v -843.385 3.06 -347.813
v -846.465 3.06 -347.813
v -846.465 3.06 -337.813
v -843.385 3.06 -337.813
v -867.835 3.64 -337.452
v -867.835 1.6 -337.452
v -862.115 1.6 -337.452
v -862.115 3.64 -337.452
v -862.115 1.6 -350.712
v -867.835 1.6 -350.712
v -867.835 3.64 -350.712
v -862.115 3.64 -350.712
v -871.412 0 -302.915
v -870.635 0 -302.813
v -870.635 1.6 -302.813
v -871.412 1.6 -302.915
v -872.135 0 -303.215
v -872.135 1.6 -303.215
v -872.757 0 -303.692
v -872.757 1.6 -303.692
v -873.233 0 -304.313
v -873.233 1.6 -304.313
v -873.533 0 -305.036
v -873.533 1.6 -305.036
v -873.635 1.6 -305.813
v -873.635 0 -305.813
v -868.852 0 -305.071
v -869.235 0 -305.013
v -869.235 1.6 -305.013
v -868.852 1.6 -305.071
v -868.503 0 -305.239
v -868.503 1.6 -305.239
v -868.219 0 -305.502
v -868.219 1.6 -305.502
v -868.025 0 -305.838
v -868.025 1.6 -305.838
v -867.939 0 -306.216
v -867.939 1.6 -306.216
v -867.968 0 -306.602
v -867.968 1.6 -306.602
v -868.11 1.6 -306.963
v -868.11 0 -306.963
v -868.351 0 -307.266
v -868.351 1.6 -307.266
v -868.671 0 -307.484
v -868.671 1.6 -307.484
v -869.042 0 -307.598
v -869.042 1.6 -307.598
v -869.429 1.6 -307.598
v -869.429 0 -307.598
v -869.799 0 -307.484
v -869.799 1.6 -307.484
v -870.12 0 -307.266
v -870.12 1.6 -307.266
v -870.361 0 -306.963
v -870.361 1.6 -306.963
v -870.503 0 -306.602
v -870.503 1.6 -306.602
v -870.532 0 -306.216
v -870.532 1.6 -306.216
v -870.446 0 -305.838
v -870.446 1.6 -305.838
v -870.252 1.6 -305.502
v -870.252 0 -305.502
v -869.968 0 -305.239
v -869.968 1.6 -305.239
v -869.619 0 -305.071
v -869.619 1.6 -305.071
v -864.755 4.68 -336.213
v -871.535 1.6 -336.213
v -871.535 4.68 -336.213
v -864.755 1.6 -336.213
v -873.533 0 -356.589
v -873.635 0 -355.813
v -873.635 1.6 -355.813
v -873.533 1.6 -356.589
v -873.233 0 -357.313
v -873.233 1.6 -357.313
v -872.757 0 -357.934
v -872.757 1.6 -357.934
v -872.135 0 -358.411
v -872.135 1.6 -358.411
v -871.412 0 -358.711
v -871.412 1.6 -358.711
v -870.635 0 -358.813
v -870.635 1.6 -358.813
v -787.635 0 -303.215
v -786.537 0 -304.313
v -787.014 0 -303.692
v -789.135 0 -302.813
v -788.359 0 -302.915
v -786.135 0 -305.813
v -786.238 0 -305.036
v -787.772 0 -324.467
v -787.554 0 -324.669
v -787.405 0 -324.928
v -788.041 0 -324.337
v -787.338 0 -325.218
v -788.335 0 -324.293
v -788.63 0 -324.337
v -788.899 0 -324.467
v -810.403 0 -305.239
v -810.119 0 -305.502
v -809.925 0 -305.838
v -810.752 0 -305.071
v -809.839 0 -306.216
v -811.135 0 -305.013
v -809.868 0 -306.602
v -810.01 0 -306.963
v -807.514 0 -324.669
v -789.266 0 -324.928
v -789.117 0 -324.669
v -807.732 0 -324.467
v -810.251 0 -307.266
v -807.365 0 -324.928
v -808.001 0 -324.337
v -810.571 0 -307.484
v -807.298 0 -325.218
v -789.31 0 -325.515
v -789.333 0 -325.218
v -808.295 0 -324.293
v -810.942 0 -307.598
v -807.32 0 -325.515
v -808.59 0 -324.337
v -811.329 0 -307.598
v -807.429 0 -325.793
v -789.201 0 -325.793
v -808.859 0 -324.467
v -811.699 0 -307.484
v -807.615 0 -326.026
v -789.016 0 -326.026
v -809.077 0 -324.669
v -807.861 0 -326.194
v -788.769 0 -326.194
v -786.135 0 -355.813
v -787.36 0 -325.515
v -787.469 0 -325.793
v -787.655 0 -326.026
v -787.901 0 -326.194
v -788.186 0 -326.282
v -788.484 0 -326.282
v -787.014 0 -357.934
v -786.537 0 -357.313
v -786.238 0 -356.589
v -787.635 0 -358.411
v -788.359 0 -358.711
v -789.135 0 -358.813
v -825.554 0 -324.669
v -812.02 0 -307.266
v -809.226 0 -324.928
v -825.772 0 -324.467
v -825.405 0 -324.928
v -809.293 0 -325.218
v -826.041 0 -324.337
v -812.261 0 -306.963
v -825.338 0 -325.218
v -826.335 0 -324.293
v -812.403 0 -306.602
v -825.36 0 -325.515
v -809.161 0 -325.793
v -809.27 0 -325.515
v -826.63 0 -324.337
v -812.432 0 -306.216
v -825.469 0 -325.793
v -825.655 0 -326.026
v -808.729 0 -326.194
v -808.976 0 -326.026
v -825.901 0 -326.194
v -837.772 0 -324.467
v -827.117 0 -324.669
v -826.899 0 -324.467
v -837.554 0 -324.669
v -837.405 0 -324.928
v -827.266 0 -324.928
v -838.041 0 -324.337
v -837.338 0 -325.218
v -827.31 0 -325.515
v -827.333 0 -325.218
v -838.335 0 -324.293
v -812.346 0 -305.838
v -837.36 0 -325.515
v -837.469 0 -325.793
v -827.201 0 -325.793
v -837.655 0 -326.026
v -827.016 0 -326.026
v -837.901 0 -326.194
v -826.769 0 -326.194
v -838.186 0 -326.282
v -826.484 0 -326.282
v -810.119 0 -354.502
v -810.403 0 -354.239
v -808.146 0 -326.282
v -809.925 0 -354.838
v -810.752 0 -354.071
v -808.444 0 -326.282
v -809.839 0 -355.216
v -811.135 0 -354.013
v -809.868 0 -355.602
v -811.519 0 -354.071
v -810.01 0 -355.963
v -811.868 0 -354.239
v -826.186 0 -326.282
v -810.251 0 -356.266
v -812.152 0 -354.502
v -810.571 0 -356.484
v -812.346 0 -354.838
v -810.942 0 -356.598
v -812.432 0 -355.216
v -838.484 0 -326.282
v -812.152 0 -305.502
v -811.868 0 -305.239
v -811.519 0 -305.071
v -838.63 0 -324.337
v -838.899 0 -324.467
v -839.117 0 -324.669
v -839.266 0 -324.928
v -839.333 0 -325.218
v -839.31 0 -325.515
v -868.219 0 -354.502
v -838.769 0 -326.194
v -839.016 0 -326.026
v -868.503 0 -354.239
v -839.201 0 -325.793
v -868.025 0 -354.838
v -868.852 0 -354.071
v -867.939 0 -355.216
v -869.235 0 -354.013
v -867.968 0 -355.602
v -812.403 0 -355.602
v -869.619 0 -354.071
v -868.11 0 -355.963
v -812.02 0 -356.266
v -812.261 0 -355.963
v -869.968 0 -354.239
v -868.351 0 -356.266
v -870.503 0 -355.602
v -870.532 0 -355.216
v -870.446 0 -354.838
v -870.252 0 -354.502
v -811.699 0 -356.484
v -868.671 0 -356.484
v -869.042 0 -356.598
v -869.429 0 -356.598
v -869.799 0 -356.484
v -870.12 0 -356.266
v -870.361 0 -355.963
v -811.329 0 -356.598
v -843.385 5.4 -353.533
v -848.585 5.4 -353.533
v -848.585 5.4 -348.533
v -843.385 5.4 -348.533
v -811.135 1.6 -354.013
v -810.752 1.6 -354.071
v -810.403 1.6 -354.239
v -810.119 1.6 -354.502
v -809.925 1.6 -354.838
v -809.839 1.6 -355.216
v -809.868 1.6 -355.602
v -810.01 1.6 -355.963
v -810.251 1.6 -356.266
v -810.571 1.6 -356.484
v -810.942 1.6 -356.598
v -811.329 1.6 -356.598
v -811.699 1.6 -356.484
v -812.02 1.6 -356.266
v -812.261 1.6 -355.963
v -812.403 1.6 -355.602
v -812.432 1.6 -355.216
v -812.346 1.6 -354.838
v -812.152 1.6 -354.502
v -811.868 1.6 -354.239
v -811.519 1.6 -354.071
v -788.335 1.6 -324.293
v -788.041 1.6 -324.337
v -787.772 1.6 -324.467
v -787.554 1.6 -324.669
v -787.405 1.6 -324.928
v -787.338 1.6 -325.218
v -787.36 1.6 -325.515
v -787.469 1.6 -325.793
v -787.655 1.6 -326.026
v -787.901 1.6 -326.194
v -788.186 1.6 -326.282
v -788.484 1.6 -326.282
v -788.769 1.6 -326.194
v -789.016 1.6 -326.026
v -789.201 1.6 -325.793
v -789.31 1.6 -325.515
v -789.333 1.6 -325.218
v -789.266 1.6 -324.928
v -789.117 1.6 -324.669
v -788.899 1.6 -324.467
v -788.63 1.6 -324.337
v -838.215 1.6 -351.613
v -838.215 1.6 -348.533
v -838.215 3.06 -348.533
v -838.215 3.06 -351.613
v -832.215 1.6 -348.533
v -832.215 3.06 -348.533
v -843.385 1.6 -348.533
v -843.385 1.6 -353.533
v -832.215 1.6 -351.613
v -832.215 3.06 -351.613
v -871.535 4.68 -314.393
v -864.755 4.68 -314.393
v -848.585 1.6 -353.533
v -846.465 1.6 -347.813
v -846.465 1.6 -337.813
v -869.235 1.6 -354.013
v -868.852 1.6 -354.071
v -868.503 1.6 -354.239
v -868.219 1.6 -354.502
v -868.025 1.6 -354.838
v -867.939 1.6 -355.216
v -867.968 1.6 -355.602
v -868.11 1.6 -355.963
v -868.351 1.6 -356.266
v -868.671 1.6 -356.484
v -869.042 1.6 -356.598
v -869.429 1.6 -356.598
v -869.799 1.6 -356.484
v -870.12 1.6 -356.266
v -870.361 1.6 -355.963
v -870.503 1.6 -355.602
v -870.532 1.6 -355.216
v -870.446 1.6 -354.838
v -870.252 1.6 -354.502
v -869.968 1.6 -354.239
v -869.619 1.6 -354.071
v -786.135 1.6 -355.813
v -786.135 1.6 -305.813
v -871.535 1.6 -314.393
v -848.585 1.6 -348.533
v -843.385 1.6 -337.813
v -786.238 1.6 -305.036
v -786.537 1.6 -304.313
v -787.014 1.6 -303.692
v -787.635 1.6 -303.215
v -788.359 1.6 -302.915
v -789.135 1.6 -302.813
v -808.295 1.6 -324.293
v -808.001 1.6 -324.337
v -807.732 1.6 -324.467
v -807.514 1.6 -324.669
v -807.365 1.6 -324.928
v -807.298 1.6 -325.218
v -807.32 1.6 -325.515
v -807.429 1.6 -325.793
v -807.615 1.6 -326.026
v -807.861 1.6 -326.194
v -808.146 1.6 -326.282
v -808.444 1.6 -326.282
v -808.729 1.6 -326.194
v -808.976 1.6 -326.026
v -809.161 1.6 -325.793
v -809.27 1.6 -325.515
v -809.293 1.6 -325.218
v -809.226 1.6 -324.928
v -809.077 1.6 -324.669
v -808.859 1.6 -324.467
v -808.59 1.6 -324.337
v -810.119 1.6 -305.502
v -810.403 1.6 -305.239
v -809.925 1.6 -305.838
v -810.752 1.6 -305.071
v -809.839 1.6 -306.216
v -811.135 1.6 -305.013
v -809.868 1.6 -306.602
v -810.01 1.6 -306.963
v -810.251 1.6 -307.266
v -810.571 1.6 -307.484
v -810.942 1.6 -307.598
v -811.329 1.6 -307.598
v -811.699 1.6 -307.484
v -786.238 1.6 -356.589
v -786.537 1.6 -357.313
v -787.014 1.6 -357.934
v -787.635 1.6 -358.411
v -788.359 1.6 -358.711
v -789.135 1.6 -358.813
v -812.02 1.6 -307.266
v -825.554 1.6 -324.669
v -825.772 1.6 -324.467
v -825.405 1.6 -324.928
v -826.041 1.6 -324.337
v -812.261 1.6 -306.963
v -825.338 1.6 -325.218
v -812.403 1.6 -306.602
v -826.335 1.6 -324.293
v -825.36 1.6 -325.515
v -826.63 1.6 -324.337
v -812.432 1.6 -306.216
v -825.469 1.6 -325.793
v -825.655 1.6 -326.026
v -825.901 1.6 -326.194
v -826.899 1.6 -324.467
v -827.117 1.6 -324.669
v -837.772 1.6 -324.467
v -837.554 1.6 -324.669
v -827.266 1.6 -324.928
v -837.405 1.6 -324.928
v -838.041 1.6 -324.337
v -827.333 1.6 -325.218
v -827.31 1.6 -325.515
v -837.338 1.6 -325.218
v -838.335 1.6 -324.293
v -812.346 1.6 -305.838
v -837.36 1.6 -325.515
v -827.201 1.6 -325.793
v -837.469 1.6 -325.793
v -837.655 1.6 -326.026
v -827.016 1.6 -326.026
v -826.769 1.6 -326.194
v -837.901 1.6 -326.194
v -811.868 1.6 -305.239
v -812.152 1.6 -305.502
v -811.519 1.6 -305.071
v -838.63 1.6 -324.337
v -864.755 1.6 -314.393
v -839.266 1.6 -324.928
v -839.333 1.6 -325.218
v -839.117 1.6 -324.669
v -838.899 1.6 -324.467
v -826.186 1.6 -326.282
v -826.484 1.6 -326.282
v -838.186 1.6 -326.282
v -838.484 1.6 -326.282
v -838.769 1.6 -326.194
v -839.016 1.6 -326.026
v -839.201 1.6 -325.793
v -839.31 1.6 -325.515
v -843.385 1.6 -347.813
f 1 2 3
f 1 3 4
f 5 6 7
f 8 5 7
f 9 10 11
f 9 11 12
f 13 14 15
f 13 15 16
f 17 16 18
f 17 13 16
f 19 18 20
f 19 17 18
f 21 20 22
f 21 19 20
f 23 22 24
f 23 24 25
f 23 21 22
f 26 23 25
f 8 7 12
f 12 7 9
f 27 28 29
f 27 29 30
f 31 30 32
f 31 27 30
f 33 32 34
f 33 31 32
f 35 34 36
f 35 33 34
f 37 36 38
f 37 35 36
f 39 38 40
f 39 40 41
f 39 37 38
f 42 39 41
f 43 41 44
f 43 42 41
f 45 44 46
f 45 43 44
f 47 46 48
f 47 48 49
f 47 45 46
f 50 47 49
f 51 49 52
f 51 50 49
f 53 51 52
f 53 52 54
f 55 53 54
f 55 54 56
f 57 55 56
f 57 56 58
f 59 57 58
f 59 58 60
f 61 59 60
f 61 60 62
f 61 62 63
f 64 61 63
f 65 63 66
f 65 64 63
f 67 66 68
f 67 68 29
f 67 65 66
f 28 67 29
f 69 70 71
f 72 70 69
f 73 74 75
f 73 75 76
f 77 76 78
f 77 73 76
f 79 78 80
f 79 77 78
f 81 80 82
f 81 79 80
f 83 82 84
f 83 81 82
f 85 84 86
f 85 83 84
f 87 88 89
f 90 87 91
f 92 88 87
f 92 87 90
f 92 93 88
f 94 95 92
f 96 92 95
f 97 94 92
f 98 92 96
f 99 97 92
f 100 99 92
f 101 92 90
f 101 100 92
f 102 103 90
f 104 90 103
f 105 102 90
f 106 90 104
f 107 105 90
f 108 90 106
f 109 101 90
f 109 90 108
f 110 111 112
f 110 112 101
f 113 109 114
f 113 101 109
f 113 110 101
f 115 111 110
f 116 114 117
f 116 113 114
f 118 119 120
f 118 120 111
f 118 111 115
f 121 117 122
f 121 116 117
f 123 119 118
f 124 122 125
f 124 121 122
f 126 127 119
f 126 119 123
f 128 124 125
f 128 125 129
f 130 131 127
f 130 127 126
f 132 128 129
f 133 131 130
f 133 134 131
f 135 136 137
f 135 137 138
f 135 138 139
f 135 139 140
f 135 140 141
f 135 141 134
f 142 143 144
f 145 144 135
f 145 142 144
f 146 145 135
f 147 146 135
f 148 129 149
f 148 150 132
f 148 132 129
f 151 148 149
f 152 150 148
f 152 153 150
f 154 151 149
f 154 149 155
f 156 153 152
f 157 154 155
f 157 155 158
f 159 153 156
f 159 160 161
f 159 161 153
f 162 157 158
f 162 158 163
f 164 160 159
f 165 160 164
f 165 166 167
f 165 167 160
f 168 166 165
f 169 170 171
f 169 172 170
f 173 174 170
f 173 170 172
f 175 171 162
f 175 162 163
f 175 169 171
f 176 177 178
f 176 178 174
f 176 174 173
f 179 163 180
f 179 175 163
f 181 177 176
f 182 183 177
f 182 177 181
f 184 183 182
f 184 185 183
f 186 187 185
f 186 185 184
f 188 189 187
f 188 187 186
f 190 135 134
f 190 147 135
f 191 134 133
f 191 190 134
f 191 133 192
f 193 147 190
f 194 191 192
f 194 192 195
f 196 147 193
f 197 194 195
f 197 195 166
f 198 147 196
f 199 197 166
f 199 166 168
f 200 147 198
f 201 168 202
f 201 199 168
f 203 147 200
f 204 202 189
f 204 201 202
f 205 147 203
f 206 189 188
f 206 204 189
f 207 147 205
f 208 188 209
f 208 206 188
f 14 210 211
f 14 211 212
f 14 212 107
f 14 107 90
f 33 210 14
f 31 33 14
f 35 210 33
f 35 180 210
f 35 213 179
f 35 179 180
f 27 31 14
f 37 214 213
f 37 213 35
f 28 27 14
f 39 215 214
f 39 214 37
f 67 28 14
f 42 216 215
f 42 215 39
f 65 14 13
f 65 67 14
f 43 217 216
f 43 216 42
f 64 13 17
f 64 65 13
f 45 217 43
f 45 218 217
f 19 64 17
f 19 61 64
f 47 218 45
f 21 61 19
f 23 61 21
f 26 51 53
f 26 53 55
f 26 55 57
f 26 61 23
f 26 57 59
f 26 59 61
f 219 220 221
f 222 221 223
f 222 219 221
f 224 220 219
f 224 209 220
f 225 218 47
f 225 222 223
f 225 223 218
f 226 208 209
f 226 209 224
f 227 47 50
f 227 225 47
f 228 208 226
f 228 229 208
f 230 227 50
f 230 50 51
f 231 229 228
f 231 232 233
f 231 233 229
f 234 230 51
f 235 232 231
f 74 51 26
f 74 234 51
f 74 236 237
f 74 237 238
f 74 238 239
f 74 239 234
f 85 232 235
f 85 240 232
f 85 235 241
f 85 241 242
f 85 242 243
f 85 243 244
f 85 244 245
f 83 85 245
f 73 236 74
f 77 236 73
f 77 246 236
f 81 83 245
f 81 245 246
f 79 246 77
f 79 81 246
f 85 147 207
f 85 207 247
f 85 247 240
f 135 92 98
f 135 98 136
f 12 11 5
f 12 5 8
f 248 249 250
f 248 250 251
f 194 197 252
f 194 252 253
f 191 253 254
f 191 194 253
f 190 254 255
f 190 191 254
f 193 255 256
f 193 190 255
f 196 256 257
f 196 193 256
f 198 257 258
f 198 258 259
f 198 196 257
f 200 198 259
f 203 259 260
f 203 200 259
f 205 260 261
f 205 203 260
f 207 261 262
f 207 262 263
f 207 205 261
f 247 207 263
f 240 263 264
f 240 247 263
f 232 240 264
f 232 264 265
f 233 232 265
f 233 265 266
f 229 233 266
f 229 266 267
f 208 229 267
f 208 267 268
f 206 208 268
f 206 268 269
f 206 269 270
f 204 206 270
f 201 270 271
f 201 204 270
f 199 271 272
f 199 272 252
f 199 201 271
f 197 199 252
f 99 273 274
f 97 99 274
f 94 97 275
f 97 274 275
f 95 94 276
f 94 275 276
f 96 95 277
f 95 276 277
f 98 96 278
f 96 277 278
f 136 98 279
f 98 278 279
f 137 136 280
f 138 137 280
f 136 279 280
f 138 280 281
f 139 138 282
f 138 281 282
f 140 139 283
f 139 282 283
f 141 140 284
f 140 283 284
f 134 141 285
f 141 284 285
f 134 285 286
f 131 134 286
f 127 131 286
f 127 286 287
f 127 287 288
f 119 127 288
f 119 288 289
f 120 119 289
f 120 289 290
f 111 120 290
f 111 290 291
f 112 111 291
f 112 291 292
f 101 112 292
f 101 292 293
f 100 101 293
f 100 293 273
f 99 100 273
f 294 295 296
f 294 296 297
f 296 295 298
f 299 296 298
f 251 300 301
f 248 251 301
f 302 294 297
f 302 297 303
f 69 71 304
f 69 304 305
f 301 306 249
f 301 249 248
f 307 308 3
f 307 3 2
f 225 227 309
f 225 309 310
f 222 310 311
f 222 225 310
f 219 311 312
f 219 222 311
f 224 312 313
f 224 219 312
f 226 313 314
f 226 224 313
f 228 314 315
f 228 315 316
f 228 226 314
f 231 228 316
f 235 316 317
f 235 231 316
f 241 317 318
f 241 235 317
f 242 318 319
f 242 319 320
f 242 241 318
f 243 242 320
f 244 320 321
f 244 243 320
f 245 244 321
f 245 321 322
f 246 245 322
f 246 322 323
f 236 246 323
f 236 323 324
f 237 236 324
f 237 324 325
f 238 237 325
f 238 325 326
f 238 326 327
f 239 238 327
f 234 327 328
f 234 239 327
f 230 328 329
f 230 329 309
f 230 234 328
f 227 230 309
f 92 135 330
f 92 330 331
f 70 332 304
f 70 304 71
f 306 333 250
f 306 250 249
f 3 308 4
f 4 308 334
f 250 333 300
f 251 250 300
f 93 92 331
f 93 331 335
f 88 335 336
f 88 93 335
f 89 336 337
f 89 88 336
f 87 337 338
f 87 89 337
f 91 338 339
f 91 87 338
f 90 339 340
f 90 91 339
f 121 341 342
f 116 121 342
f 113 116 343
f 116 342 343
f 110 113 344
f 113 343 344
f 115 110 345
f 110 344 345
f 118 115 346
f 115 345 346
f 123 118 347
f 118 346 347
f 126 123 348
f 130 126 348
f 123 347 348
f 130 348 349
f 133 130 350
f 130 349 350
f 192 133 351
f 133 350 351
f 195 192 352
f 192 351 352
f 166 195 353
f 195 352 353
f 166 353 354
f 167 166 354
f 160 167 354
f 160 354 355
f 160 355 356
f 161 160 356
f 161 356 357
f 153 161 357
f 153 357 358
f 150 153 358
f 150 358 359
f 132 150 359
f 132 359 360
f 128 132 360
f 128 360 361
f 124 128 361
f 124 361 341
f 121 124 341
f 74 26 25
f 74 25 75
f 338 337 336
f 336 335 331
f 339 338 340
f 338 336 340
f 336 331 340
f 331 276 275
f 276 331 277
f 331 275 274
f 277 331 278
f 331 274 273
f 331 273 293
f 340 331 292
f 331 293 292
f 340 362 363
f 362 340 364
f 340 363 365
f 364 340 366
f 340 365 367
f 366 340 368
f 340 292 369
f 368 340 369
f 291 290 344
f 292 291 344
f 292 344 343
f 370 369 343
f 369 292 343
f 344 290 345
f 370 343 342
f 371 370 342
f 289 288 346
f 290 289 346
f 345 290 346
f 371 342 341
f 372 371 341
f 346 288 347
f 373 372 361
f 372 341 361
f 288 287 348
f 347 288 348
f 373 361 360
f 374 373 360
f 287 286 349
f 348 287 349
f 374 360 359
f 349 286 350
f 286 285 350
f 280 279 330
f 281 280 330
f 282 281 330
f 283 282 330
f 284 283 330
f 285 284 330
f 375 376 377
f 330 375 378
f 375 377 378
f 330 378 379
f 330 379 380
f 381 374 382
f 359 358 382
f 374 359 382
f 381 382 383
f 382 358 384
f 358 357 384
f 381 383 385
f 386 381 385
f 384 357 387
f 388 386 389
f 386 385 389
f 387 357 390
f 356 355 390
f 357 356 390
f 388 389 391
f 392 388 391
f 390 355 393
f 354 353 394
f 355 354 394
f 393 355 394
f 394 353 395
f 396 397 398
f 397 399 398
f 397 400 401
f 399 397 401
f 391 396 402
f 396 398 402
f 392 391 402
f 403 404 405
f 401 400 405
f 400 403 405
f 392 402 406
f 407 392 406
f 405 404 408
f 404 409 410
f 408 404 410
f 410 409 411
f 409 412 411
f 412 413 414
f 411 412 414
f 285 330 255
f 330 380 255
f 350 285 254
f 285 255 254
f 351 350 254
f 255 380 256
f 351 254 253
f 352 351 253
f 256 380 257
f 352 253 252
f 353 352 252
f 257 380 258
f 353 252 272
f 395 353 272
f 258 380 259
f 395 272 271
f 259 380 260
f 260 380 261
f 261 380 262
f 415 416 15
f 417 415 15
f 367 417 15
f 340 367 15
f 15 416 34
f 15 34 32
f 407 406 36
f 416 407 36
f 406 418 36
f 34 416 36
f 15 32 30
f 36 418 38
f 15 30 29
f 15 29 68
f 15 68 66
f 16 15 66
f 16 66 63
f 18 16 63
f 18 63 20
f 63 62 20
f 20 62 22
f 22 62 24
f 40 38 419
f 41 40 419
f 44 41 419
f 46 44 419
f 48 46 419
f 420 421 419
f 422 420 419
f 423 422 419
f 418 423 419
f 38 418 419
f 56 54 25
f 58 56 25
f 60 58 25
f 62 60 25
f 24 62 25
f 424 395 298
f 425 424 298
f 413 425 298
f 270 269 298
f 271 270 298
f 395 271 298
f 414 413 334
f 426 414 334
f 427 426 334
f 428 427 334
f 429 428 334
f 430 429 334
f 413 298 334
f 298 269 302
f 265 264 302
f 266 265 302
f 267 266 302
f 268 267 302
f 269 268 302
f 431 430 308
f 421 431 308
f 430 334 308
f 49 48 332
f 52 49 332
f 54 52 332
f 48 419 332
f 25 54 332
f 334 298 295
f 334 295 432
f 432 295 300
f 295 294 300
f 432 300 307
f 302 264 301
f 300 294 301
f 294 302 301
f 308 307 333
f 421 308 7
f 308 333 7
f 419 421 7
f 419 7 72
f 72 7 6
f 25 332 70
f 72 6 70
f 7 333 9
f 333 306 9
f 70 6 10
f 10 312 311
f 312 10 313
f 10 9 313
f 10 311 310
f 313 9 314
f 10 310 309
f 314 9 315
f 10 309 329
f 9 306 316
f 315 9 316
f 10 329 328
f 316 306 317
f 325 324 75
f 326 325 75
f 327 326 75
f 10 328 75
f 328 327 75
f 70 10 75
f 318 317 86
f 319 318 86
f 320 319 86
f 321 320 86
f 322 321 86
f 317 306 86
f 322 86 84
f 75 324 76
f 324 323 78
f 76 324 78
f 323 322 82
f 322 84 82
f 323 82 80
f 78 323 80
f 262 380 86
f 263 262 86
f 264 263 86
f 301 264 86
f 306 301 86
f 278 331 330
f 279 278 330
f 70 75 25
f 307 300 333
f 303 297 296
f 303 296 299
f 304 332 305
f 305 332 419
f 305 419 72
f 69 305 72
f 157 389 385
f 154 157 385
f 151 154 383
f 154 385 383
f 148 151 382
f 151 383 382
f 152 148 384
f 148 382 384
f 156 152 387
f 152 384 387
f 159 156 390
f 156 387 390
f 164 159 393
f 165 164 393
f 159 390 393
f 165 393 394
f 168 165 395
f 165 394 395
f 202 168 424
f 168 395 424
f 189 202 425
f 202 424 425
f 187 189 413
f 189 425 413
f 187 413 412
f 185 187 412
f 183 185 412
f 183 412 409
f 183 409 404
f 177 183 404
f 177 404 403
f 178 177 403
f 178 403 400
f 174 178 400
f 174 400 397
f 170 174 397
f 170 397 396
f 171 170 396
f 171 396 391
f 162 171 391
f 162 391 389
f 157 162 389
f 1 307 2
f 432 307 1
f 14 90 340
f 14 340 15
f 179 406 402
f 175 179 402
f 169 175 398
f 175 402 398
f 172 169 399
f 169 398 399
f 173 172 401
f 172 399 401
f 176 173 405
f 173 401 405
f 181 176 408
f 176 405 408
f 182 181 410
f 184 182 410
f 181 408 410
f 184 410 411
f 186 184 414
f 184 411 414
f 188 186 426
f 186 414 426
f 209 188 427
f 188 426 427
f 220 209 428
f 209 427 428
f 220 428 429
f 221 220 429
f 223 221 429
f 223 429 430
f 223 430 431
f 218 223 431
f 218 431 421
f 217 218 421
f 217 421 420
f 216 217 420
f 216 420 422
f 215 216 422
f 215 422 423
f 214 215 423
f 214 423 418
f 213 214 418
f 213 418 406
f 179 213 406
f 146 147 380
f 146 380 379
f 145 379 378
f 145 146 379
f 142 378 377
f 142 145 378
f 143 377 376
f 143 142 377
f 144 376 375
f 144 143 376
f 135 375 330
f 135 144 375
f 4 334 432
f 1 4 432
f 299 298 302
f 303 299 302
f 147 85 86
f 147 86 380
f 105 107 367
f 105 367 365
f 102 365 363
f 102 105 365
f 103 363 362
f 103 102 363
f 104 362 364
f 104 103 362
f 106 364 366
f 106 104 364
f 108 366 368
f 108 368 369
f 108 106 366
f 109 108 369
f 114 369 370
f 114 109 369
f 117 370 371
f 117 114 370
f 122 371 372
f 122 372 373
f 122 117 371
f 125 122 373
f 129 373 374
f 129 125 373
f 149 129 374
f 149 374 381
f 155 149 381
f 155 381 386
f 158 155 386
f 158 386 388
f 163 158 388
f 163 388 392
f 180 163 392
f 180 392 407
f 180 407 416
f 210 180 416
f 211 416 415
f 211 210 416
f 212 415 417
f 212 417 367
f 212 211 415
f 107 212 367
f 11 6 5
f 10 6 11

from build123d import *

# Parameters (mm, degrees)
SKETCH1_R                    = 1.3
PCB_DEPTH                    = 1.6
NVME_M_KEY_SCREW_HOLES_REACH = 946.451
SKETCH2_R                    = 1
SKETCH3_W                    = 6.78
SKETCH3_H                    = 21.82
NVME_M_KEY_CONNECTOR_DEPTH   = 3.08
SKETCH4_W                    = 5.72
SKETCH4_H                    = 13.26
PCI_E_CONNECTOR_DEPTH        = 2.04
SKETCH5_W                    = 5.2
SKETCH5_H                    = 5
INDUCTANCE_DEPTH             = 3.8
SKETCH6_W                    = 3.08
SKETCH6_H                    = 10
SKETCH6_W_2                  = 6
SKETCH6_H_2                  = 3.08
CAPACITORS_DEPTH             = 1.46


with BuildPart() as part:
    # Sketch1 → pcb (new body)
    with BuildSketch(Plane(origin=(0, 0, 0), x_dir=(1, 0, 0), z_dir=(0, 1, 0))):
        with BuildLine():
            Line((-870.635383482, 358.81294964), (-789.135383482, 358.81294964))
            ThreePointArc((-789.135383482, 358.81294964), (-787.014063138, 357.934269984), (-786.135383482, 355.81294964))
            Line((-786.135383482, 355.81294964), (-786.135383482, 305.81294964))
            ThreePointArc((-786.135383482, 305.81294964), (-787.014063138, 303.691629297), (-789.135383482, 302.81294964))
            Line((-789.135383482, 302.81294964), (-870.635383482, 302.81294964))
            ThreePointArc((-870.635383482, 302.81294964), (-872.756703825, 303.691629297), (-873.635383482, 305.81294964))
            Line((-873.635383482, 305.81294964), (-873.635383482, 355.81294964))
            ThreePointArc((-873.635383482, 355.81294964), (-872.756703825, 357.934269984), (-870.635383482, 358.81294964))
        make_face()
        with Locations(Location((-869.235383482, 355.31294964, 0), (0, 0, 270))):
            Circle(SKETCH1_R, mode=Mode.SUBTRACT)
        with Locations(Location((-869.235383482, 306.31294964, 0), (0, 0, 270))):
            Circle(SKETCH1_R, mode=Mode.SUBTRACT)
        with Locations(Location((-811.135383482, 355.31294964, 0), (0, 0, 270))):
            Circle(SKETCH1_R, mode=Mode.SUBTRACT)
        with Locations(Location((-811.135383482, 306.31294964, 0), (0, 0, 270))):
            Circle(SKETCH1_R, mode=Mode.SUBTRACT)
    extrude(amount=PCB_DEPTH)

    # Sketch2 → NVMe-M-Key screw holes (cut, up to next)
    with BuildSketch(Plane(origin=(0, 1.6, 0), x_dir=(1, 0, 0), z_dir=(0, 1, 0)), mode=Mode.PRIVATE) as nvme_m_key_screw_holes_sk1:
        with Locations(Location((-788.335383482, 325.29294964, 0), (0, 0, 270))):
            Circle(SKETCH2_R)
    nvme_m_key_screw_holes_tool1 = extrude(nvme_m_key_screw_holes_sk1.sketch, amount=-NVME_M_KEY_SCREW_HOLES_REACH, mode=Mode.PRIVATE) & part.part
    # Sketch2 → NVMe-M-Key screw holes (cut, up to next)
    with BuildSketch(Plane(origin=(0, 1.6, 0), x_dir=(1, 0, 0), z_dir=(0, 1, 0)), mode=Mode.PRIVATE) as nvme_m_key_screw_holes_sk2:
        with Locations(Location((-808.295383482, 325.29294964, 0), (0, 0, 270))):
            Circle(SKETCH2_R)
    nvme_m_key_screw_holes_tool2 = extrude(nvme_m_key_screw_holes_sk2.sketch, amount=-NVME_M_KEY_SCREW_HOLES_REACH, mode=Mode.PRIVATE) & part.part
    # Sketch2 → NVMe-M-Key screw holes (cut, up to next)
    with BuildSketch(Plane(origin=(0, 1.6, 0), x_dir=(1, 0, 0), z_dir=(0, 1, 0)), mode=Mode.PRIVATE) as nvme_m_key_screw_holes_sk3:
        with Locations(Location((-826.335383482, 325.29294964, 0), (0, 0, 270))):
            Circle(SKETCH2_R)
    nvme_m_key_screw_holes_tool3 = extrude(nvme_m_key_screw_holes_sk3.sketch, amount=-NVME_M_KEY_SCREW_HOLES_REACH, mode=Mode.PRIVATE) & part.part
    # Sketch2 → NVMe-M-Key screw holes (cut, up to next)
    with BuildSketch(Plane(origin=(0, 1.6, 0), x_dir=(1, 0, 0), z_dir=(0, 1, 0)), mode=Mode.PRIVATE) as nvme_m_key_screw_holes_sk4:
        with Locations(Location((-838.335383482, 325.29294964, 0), (0, 0, 270))):
            Circle(SKETCH2_R)
    nvme_m_key_screw_holes_tool4 = extrude(nvme_m_key_screw_holes_sk4.sketch, amount=-NVME_M_KEY_SCREW_HOLES_REACH, mode=Mode.PRIVATE) & part.part
    add(nvme_m_key_screw_holes_tool1.solids().sort_by_distance((-788.335383, 1.6, -325.29295))[0], mode=Mode.SUBTRACT)
    add(nvme_m_key_screw_holes_tool2.solids().sort_by_distance((-808.295383, 1.6, -325.29295))[0], mode=Mode.SUBTRACT)
    add(nvme_m_key_screw_holes_tool3.solids().sort_by_distance((-826.335383, 1.6, -325.29295))[0], mode=Mode.SUBTRACT)
    add(nvme_m_key_screw_holes_tool4.solids().sort_by_distance((-838.335383, 1.6, -325.29295))[0], mode=Mode.SUBTRACT)

    # Sketch3 → NVMe-M-Key connector (add)
    with BuildSketch(Plane(origin=(0, 1.6, 0), x_dir=(1, 0, 0), z_dir=(0, 1, 0))):
        with Locations((-868.145383482, 325.30294964)):
            Rectangle(SKETCH3_W, SKETCH3_H)
    extrude(amount=NVME_M_KEY_CONNECTOR_DEPTH)

    # Sketch4 → PCI-E connector (add)
    with BuildSketch(Plane(origin=(0, 1.6, 0), x_dir=(1, 0, 0), z_dir=(0, 1, 0))):
        with Locations((-864.975383482, 344.081798362)):
            Rectangle(SKETCH4_W, SKETCH4_H)
    extrude(amount=PCI_E_CONNECTOR_DEPTH)

    # Sketch5 → Inductance (add)
    with BuildSketch(Plane(origin=(0, 1.6, 0), x_dir=(1, 0, 0), z_dir=(0, 1, 0))):
        with Locations((-845.985383482, 351.03294964)):
            Rectangle(SKETCH5_W, SKETCH5_H)
    extrude(amount=INDUCTANCE_DEPTH)

    # Sketch6 → Capacitors (add)
    with BuildSketch(Plane(origin=(0, 1.6, 0), x_dir=(1, 0, 0), z_dir=(0, 1, 0))):
        with Locations((-844.925383482, 342.81294964)):
            Rectangle(SKETCH6_W, SKETCH6_H)
        with Locations((-835.215383482, 350.07294964)):
            Rectangle(SKETCH6_W_2, SKETCH6_H_2)
    extrude(amount=CAPACITORS_DEPTH)


solid = part.part
